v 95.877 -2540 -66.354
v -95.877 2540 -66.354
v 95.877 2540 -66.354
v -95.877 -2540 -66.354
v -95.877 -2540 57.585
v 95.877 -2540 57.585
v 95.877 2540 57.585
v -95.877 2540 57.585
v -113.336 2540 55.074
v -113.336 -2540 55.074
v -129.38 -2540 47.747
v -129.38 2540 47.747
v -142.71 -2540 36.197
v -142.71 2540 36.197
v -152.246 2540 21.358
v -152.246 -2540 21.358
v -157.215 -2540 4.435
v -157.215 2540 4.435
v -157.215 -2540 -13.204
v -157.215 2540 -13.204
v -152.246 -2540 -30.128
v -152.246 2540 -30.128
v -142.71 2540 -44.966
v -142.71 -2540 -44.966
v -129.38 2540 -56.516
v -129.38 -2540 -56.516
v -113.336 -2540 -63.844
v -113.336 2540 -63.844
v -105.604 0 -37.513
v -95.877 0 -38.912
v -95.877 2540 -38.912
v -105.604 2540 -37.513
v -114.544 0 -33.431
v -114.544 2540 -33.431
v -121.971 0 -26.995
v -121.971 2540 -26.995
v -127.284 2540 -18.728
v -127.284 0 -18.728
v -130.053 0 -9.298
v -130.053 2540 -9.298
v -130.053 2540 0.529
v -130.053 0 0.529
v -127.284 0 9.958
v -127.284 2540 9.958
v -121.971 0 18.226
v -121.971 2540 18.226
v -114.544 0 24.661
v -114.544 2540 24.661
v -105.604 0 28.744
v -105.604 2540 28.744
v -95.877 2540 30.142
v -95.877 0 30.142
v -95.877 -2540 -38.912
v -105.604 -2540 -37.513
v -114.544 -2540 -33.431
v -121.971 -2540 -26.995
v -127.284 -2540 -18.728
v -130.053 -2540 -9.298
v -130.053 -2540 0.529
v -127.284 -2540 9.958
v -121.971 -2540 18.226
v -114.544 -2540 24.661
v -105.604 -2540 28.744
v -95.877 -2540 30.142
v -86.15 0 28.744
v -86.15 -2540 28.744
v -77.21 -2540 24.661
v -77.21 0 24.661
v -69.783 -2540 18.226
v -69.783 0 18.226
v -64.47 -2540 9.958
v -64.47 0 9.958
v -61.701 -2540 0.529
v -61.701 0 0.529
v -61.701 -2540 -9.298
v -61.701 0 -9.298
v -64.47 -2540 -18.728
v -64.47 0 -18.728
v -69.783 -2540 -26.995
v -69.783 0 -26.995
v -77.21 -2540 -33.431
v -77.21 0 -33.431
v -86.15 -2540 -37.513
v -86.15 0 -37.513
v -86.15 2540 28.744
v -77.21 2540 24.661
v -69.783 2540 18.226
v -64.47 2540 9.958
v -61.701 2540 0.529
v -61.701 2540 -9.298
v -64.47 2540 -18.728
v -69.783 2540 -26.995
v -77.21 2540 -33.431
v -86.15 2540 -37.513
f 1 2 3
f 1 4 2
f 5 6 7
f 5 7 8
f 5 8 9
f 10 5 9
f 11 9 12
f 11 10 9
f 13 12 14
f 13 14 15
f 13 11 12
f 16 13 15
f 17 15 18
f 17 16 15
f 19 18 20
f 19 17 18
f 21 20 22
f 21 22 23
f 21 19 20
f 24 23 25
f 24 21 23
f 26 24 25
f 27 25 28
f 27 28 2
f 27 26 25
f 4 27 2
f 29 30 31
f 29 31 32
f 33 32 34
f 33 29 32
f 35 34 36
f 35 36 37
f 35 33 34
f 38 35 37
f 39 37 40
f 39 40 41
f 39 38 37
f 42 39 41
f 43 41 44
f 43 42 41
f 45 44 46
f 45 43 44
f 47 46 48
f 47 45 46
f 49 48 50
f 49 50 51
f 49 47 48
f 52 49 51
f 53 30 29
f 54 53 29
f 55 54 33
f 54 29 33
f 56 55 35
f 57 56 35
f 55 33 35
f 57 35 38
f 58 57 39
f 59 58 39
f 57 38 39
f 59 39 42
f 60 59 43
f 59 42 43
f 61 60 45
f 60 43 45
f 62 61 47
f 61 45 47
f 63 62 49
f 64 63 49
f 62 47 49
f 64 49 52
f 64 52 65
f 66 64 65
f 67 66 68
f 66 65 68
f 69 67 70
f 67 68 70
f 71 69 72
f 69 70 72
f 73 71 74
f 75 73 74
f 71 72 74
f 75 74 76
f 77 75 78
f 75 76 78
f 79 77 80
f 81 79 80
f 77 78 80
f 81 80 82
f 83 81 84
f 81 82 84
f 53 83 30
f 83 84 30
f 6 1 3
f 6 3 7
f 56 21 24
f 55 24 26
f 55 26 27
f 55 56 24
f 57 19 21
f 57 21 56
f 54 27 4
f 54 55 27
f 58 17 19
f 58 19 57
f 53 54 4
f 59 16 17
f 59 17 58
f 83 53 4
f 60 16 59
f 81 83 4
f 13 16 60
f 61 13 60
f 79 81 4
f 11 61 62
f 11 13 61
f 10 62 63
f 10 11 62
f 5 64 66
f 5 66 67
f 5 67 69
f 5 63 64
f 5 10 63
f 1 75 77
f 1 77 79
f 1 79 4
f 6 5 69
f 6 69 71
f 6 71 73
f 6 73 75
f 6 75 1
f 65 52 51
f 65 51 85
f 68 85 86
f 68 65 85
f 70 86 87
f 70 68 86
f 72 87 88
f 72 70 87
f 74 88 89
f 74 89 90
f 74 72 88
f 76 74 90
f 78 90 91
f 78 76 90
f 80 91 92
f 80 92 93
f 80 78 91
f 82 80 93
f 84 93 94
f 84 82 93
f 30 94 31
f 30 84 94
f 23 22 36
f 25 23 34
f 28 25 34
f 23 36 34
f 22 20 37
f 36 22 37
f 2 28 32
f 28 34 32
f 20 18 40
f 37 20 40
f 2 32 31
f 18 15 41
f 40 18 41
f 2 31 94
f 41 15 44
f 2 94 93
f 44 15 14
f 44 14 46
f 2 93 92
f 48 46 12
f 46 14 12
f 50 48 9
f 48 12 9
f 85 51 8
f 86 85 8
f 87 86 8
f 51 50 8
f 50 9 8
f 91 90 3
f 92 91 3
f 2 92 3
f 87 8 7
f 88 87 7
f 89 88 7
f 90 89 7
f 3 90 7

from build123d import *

# Parameters (mm, degrees)
F1_DEPTH = 2540


with BuildPart() as f1:
    # F0 (on Front) → F1 (new body, symmetric)
    with BuildSketch(Plane.XZ):
        with BuildLine():
            ThreePointArc((-33.9077054523, -4.3846159242), (-52.0580848188, -48.2035079531), (-95.8769768476, -66.3538873196))
            Line((-95.8769768476, -66.3538873196), (95.8769768476, -66.3538873196))
            Line((95.8769768476, -66.3538873196), (95.8769768476, 57.5846554711))
            Line((95.8769768476, 57.5846554711), (-95.8769768476, 57.5846554711))
            ThreePointArc((-95.8769768476, 57.5846554711), (-52.0580848188, 39.4342761046), (-33.9077054523, -4.3846159242))
        make_face()
        with BuildLine():
            ThreePointArc((-95.8769768476, 57.5846554711), (-157.846248243, -4.3846159242), (-95.8769768476, -66.3538873196))
            Line((-95.8769768476, -66.3538873196), (-95.8769768476, -38.9116128696))
            ThreePointArc((-95.8769768476, -38.9116128696), (-130.4039737931, -4.3846159242), (-95.8769768476, 30.1423810212))
            Line((-95.8769768476, 30.1423810212), (-95.8769768476, 57.5846554711))
        make_face()
        with BuildLine():
            Line((-95.8769768476, -38.9116128696), (-95.8769768476, -66.3538873196))
            ThreePointArc((-95.8769768476, -66.3538873196), (-52.0580848188, -48.2035079531), (-33.9077054523, -4.3846159242))
            ThreePointArc((-33.9077054523, -4.3846159242), (-52.0580848188, 39.4342761046), (-95.8769768476, 57.5846554711))
            Line((-95.8769768476, 57.5846554711), (-95.8769768476, 30.1423810212))
            ThreePointArc((-95.8769768476, 30.1423810212), (-71.4627031735, 20.0296577499), (-61.3499799022, -4.3846159242))
            ThreePointArc((-61.3499799022, -4.3846159242), (-71.4627031735, -28.7988895983), (-95.8769768476, -38.9116128696))
        make_face()
    extrude(amount=F1_DEPTH, both=True)


solid = f1.part
